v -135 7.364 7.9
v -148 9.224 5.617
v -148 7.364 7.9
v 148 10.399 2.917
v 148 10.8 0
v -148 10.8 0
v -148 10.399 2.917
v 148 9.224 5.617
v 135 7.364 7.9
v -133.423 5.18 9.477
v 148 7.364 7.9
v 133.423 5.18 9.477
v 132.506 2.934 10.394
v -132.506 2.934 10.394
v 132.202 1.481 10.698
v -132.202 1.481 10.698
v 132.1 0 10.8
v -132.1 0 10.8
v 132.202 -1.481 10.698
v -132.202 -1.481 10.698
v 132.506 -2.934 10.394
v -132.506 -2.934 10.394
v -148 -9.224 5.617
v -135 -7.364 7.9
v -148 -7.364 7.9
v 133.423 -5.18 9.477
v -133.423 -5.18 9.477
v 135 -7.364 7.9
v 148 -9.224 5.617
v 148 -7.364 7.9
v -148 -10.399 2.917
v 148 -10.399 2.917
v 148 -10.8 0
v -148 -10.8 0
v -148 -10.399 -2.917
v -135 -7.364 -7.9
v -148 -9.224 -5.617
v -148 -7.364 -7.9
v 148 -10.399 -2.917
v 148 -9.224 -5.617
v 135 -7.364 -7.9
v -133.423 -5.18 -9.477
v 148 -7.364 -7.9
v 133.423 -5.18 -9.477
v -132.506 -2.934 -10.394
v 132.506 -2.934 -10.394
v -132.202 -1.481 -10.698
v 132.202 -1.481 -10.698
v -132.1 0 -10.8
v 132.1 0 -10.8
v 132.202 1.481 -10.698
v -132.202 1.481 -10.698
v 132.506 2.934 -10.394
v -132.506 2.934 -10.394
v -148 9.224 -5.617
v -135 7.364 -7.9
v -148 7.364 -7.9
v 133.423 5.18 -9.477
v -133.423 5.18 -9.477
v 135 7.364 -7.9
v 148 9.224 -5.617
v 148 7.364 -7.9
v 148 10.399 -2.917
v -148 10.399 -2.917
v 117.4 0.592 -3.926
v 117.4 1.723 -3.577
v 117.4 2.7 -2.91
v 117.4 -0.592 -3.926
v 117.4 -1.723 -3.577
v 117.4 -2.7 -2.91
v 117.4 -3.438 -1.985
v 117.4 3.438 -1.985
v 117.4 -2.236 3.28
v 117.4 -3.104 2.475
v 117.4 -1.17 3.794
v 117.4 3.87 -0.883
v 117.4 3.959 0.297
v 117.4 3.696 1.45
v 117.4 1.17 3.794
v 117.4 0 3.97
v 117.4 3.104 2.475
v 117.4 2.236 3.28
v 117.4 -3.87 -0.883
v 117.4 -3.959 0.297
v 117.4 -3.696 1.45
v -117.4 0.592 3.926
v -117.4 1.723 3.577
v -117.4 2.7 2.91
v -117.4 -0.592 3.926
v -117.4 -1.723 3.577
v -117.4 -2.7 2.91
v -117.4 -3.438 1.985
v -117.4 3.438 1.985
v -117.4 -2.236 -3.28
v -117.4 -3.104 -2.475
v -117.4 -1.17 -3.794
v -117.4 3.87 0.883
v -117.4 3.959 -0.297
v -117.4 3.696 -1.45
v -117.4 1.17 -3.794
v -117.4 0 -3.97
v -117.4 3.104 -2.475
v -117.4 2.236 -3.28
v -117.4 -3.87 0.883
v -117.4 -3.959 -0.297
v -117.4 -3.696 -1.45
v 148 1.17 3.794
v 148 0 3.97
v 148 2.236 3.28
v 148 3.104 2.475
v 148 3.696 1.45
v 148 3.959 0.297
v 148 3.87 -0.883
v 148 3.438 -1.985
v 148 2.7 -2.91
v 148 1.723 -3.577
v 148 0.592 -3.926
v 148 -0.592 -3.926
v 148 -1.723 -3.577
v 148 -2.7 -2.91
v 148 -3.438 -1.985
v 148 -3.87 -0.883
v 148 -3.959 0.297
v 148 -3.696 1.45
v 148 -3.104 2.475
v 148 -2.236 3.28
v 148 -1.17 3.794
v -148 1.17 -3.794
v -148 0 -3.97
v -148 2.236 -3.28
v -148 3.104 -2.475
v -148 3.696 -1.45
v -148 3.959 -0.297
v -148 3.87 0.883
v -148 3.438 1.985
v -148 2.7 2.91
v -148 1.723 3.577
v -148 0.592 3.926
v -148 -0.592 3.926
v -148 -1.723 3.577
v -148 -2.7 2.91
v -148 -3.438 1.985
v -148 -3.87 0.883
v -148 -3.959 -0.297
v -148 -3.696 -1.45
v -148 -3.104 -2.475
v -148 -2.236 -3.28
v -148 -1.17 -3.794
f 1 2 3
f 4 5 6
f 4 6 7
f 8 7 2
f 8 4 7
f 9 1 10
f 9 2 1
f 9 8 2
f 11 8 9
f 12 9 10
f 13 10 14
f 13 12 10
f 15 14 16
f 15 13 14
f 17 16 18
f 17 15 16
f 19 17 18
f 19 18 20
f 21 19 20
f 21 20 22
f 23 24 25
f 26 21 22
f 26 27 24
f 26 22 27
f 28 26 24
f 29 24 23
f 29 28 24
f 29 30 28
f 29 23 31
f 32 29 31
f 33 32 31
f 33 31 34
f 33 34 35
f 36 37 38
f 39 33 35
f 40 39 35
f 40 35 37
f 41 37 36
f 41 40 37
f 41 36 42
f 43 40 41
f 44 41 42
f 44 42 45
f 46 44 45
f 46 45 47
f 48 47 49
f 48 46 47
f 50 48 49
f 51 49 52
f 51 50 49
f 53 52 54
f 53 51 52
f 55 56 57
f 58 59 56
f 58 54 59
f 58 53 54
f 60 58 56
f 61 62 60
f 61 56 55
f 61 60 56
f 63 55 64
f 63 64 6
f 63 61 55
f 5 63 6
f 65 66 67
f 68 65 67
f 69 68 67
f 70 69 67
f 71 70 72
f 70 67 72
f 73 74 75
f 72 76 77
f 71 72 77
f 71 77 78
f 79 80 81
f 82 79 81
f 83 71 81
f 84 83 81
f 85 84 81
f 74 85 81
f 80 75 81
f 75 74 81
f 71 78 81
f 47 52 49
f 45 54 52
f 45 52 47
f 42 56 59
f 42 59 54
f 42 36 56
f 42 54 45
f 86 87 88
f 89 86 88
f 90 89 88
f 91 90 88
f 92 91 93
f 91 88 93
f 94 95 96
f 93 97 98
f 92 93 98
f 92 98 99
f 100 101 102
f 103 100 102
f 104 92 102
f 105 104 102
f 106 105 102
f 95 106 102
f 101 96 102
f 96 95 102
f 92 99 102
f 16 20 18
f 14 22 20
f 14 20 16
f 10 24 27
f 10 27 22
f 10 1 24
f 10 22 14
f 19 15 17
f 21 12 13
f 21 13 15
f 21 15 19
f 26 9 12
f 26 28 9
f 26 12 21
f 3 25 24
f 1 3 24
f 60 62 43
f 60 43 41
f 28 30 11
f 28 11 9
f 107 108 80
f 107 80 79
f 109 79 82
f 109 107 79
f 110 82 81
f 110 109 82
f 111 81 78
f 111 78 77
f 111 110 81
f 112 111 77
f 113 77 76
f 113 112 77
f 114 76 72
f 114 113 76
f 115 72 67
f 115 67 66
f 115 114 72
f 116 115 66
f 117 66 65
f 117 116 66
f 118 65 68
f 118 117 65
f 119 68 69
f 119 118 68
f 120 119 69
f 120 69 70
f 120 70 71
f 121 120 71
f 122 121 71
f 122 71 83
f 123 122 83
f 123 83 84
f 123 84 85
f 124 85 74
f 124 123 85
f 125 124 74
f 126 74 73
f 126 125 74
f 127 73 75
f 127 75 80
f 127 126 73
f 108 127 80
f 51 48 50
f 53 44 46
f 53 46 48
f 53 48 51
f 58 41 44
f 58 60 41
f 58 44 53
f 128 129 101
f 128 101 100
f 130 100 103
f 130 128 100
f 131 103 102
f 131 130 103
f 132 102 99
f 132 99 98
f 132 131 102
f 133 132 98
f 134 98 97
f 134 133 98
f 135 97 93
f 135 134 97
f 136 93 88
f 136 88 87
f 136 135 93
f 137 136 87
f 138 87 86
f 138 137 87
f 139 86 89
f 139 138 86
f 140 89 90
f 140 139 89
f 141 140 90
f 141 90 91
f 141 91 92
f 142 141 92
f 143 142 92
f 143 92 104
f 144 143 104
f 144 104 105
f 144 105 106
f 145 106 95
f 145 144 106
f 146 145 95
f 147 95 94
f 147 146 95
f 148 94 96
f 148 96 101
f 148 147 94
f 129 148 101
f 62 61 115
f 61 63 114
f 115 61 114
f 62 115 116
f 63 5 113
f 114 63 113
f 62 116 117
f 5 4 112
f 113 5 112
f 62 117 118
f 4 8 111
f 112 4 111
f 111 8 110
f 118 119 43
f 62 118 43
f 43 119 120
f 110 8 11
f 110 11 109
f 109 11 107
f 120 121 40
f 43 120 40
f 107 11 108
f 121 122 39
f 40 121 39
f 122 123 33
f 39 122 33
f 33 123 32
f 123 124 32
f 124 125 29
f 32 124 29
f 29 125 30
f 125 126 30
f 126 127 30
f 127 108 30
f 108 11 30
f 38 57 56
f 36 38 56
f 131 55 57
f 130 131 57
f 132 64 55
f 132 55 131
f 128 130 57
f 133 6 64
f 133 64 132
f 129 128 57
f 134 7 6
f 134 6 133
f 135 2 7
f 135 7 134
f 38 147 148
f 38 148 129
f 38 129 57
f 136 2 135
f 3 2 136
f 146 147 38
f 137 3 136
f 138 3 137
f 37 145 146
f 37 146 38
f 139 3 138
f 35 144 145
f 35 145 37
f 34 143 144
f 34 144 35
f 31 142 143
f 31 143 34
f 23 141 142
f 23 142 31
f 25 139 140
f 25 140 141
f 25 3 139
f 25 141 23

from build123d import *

# Parameters (mm, degrees)
SKETCH4_W               = 296
SKETCH4_H               = 10.8
CUT_EXTRUDE1_DEPTH      = 11.8
CUT_EXTRUDE1_DEPTH_BACK = 11.8
SKETCH2_R               = 3.97
EXTRUDE2_DEPTH          = 30.6
SKETCH3_R               = 3.97
EXTRUDE3_DEPTH          = 30.6


with BuildPart() as part:
    # Sketch4 → Revolve1 (revolve)
    with BuildSketch(Plane.XY):
        with Locations((0, 5.4)):
            Rectangle(SKETCH4_W, SKETCH4_H)
    revolve(axis=Axis((-180.472392976, 0, 0), (1, 0, 0)))

    # Sketch5 → Cut-Extrude1 (cut, two sides)
    with BuildSketch(Plane(origin=(0, 0, 0), x_dir=(1, 0, 0), z_dir=(0, 1, 0))) as cut_extrude1_sk:
        Polygon((-172.80595371, 7.9), (-135, 7.9), (-126.264796731, 16.635203269), (-172.80595371, 16.635203269), align=None)
        Polygon((-172.80595371, -7.9), (-135, -7.9), (-126.264796731, -16.635203269), (-172.80595371, -16.635203269), align=None)
        Polygon((135, -7.9), (126.264796731, -16.635203269), (172.80595371, -16.635203269), (172.80595371, -7.9), align=None)
        Polygon((135, 7.9), (126.264796731, 16.635203269), (172.80595371, 16.635203269), (172.80595371, 7.9), align=None)
    extrude(amount=CUT_EXTRUDE1_DEPTH, mode=Mode.SUBTRACT)
    extrude(cut_extrude1_sk.sketch, amount=-CUT_EXTRUDE1_DEPTH_BACK, mode=Mode.SUBTRACT)

    # Sketch2 → Extrude2 (cut)
    with BuildSketch(Plane(origin=(-148, 0, 0), x_dir=(0, 0, -1), z_dir=(1, 0, 0))):
        Circle(SKETCH2_R)
    extrude(amount=EXTRUDE2_DEPTH, mode=Mode.SUBTRACT)

    # Sketch3 → Extrude3 (cut)
    with BuildSketch(Plane.ZY.offset(-148)):
        Circle(SKETCH3_R)
    extrude(amount=EXTRUDE3_DEPTH, mode=Mode.SUBTRACT)


solid = part.part
